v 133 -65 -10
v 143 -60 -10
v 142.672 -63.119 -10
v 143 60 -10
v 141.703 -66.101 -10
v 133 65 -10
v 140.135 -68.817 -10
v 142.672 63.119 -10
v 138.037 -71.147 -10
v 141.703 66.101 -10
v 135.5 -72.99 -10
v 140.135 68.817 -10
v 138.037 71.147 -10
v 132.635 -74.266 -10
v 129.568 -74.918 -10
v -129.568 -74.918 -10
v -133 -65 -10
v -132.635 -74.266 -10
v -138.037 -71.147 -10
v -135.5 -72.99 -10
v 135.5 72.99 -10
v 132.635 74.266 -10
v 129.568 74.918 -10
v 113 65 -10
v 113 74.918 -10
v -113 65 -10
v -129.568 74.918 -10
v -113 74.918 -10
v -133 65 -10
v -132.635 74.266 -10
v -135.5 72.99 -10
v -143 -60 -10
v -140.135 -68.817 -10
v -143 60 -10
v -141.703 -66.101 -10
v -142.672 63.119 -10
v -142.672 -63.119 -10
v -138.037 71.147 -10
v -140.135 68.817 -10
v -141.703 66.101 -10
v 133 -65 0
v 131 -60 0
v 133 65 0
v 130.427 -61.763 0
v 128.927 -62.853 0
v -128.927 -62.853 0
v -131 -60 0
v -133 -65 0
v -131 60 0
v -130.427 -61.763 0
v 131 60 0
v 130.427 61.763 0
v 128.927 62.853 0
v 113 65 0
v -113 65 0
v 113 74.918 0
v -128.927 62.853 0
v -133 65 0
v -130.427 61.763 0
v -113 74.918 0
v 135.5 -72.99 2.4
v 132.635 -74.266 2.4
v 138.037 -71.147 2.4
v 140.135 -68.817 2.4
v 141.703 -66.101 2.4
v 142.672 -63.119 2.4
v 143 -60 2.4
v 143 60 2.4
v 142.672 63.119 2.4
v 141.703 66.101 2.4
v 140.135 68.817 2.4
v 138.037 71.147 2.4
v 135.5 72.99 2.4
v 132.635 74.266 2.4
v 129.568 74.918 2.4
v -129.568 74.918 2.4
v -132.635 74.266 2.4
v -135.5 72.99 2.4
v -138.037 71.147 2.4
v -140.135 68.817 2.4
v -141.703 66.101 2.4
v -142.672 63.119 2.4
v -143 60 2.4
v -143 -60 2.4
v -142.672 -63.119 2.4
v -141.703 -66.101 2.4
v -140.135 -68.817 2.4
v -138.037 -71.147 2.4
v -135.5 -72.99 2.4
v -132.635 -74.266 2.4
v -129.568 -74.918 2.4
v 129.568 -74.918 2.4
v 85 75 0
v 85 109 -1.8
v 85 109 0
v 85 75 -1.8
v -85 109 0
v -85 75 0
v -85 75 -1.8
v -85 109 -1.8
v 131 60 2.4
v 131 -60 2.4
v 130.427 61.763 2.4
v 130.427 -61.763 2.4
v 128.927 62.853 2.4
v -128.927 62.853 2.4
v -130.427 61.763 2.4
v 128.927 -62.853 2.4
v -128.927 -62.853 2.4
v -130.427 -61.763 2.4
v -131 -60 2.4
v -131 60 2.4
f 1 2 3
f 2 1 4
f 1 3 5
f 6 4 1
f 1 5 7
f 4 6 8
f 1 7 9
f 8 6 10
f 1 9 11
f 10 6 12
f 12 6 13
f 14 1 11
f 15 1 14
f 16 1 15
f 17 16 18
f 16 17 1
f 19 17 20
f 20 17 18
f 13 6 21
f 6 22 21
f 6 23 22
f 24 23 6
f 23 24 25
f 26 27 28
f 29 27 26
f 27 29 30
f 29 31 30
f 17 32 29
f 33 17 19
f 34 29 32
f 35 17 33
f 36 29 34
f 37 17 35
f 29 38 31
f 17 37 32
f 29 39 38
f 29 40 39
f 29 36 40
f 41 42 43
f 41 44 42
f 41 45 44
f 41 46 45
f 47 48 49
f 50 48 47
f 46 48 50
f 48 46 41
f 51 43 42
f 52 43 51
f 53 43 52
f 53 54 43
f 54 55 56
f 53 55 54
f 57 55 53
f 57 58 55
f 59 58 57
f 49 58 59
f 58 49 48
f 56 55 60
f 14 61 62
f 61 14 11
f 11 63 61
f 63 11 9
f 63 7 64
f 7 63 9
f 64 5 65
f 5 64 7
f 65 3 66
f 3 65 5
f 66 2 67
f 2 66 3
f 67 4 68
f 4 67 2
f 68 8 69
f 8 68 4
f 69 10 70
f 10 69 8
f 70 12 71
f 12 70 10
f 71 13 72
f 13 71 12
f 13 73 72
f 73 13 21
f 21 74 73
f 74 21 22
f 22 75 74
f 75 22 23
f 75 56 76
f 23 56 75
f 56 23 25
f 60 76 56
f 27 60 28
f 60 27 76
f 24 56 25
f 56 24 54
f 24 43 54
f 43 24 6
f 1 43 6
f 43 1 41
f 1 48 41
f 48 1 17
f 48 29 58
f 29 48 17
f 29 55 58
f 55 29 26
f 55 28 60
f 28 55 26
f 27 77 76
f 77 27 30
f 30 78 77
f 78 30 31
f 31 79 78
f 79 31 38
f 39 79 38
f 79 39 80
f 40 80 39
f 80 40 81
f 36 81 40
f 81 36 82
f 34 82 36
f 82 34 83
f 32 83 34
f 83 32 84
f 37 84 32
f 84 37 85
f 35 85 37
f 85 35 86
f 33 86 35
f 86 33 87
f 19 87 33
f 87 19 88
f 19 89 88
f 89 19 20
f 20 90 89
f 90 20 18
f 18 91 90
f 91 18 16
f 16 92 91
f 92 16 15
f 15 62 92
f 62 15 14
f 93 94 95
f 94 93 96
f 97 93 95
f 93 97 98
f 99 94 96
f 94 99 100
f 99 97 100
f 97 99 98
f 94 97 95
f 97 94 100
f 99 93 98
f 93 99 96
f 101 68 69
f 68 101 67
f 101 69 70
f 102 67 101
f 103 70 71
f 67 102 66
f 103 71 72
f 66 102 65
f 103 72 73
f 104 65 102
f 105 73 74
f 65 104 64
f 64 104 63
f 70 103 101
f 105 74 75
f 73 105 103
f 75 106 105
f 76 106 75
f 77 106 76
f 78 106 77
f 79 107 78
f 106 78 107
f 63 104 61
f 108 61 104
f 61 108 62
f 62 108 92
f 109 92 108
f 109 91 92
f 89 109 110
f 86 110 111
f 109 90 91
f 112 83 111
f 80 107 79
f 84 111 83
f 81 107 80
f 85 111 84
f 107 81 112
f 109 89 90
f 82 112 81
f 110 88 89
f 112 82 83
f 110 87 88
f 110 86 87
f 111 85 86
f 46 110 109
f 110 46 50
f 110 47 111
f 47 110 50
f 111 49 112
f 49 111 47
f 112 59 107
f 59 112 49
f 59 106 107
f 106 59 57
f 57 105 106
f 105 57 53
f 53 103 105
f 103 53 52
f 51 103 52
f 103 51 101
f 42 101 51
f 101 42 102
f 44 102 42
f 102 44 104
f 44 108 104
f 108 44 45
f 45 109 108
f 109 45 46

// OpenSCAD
// file: ../../lib/project/util.scad
// lib/project/util.scad

module rounded_rect_2d(size = [10, 10], r = 2) {
  x = size[0];
  y = size[1];
  rr = min(r, min(x, y) / 2);

  hull() {
    for (sx = [-1, 1], sy = [-1, 1]) {
      translate([sx * (x / 2 - rr), sy * (y / 2 - rr)])
        circle(r = rr);
    }
  }
}
// file: ../../lib/project/params.scad
// lib/project/params.scad
// Shared project parameters for the final tray and all fit-test models.

debug = false;

// Main tray footprint.
tray_w = 286;
tray_d = 150;
tray_corner_r = 15;

// Top tray shell.
tray_floor_t = 2.4;
tray_wall_h = 9;
top_wall_w = 10;

// Underside support lip and rear support section.
support_lip_drop = 10;
support_lip_w = 10;
rear_gap_w = 28;
rear_tongue_w = 170;
rear_tongue_depth = 34;
rear_tongue_t = 1.8;

// Cup holder location and plug geometry.
cup_spacing = 118;
cup_y_from_front = 72;
plug_top_d = 85;
plug_bottom_d = 73;
plug_h = 62;
plug_clearance_z = 0;

// Fit-test defaults.
test_plug_top_ds = [84, 85, 86];
test_spacing_values = [116, 118, 120];
test_lip_drop_values = [8, 10, 12];
test_rear_tongue_ts = [1.4, 1.8, 2.2];
test_frame_wall_w = 12;
test_front_zone_depth = 100;
test_rear_zone_depth = 56;
test_gap_section_w = 140;
test_coupon_spacing = 18;
// main file
use <../../lib/project/console_tray.scad>;
include <../../lib/project/params.scad>;

perimeter_frame_variant(
  tray_w = tray_w,
  tray_d = tray_d,
  tray_corner_r = tray_corner_r,
  frame_wall_w = test_frame_wall_w,
  tray_floor_t = tray_floor_t,
  support_lip_drop = support_lip_drop,
  support_lip_w = support_lip_w,
  rear_gap_w = rear_gap_w,
  rear_tongue_w = rear_tongue_w,
  rear_tongue_depth = rear_tongue_depth,
  rear_tongue_t = rear_tongue_t
);
